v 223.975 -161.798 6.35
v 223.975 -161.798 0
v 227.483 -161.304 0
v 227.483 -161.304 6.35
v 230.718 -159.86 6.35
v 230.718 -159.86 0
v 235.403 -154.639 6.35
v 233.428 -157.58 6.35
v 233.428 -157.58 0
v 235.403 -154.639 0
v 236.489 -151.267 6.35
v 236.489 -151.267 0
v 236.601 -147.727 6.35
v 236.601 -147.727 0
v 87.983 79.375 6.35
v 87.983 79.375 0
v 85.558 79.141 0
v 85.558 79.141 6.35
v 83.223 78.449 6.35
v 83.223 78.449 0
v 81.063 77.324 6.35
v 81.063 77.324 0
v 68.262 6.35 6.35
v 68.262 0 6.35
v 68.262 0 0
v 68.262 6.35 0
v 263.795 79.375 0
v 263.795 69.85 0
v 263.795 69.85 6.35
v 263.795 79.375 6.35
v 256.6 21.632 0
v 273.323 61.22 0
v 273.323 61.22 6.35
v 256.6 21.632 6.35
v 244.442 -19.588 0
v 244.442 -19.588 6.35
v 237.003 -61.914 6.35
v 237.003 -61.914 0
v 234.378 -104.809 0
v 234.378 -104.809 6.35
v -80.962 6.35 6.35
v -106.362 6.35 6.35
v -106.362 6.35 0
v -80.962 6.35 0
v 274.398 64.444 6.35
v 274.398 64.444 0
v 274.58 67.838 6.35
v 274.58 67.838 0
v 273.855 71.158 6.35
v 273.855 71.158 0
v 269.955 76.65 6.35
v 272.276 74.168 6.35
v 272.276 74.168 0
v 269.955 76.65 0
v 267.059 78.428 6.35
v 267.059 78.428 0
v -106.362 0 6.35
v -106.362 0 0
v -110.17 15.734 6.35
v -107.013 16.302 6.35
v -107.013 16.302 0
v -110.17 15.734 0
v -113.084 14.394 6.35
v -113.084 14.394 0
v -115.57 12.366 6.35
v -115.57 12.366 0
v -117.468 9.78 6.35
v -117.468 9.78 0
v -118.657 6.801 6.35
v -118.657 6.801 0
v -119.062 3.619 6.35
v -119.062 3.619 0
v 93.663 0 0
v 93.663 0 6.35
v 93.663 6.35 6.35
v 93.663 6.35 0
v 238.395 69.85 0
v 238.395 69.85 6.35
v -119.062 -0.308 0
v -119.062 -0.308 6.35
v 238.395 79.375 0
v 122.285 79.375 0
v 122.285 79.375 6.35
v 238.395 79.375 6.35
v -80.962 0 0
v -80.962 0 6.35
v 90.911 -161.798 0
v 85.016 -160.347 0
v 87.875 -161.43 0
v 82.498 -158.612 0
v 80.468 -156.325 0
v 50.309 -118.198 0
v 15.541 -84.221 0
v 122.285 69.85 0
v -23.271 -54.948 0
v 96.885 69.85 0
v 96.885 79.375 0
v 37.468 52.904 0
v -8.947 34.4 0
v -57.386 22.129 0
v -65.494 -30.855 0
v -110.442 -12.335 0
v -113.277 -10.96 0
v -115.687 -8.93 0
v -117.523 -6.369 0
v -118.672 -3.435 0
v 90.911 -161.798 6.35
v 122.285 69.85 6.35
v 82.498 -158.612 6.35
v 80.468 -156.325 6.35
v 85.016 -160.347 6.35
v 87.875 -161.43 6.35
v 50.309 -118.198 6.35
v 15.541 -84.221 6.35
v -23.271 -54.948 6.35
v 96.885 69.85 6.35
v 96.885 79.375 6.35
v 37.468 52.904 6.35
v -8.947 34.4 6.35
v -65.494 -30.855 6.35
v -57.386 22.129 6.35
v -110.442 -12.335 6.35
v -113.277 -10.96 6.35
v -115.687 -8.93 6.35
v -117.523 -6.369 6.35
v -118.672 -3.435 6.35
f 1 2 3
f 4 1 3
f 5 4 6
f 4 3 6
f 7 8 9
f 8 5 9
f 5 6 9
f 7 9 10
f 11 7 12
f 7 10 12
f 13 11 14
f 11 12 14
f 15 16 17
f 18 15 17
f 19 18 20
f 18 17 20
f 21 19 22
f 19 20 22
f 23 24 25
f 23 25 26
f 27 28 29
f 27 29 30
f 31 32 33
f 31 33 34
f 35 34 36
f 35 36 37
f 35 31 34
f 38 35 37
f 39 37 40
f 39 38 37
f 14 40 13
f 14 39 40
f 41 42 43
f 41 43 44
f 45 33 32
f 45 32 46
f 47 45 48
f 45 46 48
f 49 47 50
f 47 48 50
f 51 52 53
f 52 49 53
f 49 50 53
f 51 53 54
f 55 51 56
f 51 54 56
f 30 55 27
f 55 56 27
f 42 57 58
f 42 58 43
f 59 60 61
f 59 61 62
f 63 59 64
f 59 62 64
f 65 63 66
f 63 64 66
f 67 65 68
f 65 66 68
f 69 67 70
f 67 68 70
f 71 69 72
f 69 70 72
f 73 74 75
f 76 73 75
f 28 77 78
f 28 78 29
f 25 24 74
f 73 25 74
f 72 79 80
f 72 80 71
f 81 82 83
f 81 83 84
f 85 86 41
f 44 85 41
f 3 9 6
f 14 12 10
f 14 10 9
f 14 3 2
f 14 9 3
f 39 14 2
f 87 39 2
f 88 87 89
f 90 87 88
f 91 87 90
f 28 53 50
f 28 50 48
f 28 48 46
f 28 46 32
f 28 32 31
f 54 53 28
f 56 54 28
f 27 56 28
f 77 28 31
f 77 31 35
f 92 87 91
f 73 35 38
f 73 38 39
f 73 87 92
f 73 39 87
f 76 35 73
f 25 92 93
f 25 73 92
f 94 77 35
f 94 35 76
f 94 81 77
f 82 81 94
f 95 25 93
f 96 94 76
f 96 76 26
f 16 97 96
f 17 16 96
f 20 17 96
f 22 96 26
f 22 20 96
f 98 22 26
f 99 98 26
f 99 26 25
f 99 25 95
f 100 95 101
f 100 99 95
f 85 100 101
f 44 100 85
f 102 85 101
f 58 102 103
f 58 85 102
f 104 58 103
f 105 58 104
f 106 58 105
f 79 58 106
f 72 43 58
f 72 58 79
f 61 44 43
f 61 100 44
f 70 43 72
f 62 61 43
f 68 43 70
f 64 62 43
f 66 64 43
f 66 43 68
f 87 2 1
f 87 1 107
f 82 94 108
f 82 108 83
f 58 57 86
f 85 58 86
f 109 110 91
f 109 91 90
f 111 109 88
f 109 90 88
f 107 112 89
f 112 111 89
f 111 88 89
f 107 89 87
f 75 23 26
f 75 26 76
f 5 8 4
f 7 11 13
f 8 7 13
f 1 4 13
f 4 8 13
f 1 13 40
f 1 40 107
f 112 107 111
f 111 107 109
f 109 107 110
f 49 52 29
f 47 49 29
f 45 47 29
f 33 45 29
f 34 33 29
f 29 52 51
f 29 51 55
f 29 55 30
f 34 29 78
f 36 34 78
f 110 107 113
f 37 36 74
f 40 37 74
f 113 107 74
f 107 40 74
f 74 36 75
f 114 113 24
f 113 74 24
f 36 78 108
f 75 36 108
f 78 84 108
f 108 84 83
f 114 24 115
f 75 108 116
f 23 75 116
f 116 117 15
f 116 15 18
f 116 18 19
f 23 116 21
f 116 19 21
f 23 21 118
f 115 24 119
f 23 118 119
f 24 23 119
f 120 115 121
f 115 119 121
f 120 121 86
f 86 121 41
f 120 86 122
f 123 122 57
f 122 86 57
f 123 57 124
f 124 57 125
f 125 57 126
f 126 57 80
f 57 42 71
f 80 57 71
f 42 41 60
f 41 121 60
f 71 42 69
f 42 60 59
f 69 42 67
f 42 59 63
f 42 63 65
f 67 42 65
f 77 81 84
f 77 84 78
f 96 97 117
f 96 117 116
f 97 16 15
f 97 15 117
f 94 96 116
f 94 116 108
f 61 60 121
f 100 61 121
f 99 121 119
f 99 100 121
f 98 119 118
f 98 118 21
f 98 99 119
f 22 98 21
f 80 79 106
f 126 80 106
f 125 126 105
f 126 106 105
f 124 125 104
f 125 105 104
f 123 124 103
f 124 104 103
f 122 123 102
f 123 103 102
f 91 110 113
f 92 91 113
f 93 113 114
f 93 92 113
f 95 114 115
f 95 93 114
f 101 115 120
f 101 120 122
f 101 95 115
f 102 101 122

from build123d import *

# Parameters (mm, degrees)
EXTRUDE1_DEPTH     = 6.35
CUT_EXTRUDE1_REACH = 327.914
SKETCH2_W          = 25.4
SKETCH2_H          = 6.35
FILLET1_R          = 12.7


with BuildPart() as part:
    # Sketch1 → Extrude1 (new body)
    with BuildSketch(Plane.XY):
        with BuildLine():
            Line((-119.0625, -9.525), (-119.0625, 15.875))
            ThreePointArc((-119.0625, 15.875), (-12.912203714, 33.137302813), (84.185416539, 79.375))
            Line((84.185416539, 79.375), (96.885416539, 79.375))
            Line((96.885416539, 79.375), (96.885416539, 69.85))
            Line((96.885416539, 69.85), (122.285416539, 69.85))
            Line((122.285416539, 69.85), (122.285416539, 79.375))
            Line((122.285416539, 79.375), (238.394583461, 79.375))
            Line((238.394583461, 79.375), (238.394583461, 69.85))
            Line((238.394583461, 69.85), (263.794583461, 69.85))
            Line((263.794583461, 69.85), (263.794583461, 79.375))
            Line((263.794583461, 79.375), (282.844583461, 79.375))
            ThreePointArc((282.844583461, 79.375), (240.685076339, -37.537420224), (238.394583461, -161.797999999))
            Line((238.394583461, -161.797999999), (84.185416539, -161.797999999))
            ThreePointArc((84.185416539, -161.797999999), (-4.377647242, -68.228339866), (-119.0625, -9.525))
        make_face()
    extrude(amount=EXTRUDE1_DEPTH)

    # Sketch2 → Cut-Extrude1 (cut, up to next)
    with BuildSketch(Plane.XY.offset(6.35), mode=Mode.PRIVATE) as cut_extrude1_sk1:
        with Locations((80.9625, 3.175)):
            Rectangle(SKETCH2_W, SKETCH2_H)
    cut_extrude1_tool1 = extrude(cut_extrude1_sk1.sketch, amount=-CUT_EXTRUDE1_REACH, mode=Mode.PRIVATE) & part.part
    # Sketch2 → Cut-Extrude1 (cut, up to next)
    with BuildSketch(Plane.XY.offset(6.35), mode=Mode.PRIVATE) as cut_extrude1_sk2:
        with Locations((-93.6625, 3.175)):
            Rectangle(SKETCH2_W, SKETCH2_H)
    cut_extrude1_tool2 = extrude(cut_extrude1_sk2.sketch, amount=-CUT_EXTRUDE1_REACH, mode=Mode.PRIVATE) & part.part
    add(cut_extrude1_tool1.solids().sort_by_distance((80.9625, 3.175, 6.35))[0], mode=Mode.SUBTRACT)
    add(cut_extrude1_tool2.solids().sort_by_distance((-93.6625, 3.175, 6.35))[0], mode=Mode.SUBTRACT)

    # Fillet1
    # the kernel refuses this fillet: 12.7 mm, written as the material it takes off along each edge
    with BuildSketch(Plane(origin=(-119.0625, -9.525, -23.042479417), x_dir=(0, 1, 0), z_dir=(0, 0, 1))) as fillet1_piece_1:
        with BuildLine():
            CenterArc((9.216991767, -12.7), FILLET1_R, 90, 71.264145378)
            Line((-2.810028359, -8.620687938), (-3.050568761, -8.539101697))
            ThreePointArc((-3.050568761, -8.539101697), (-1.620862846, -4.239985213), (-0.242413755, 0.075839116))
            Line((-0.242413755, 0.075839116), (0, 0.254))
            Line((0, 0.254), (9.216991767, 0.254))
            Line((9.216991767, 0.254), (9.216991767, 0))
        make_face()
    extrude(amount=52.434958835, mode=Mode.SUBTRACT)
    with BuildSketch(Plane(origin=(-119.0625, 15.875, -30.640711511), x_dir=(0, -1, 0), z_dir=(0, 0, 1))) as fillet1_piece_2:
        with BuildLine():
            CenterArc((12.256284605, 12.7), FILLET1_R, 182.936375733, 87.063624267)
            Line((-0.427040748, 12.049417188), (-0.680707255, 12.036405531))
            ThreePointArc((-0.680707255, 12.036405531), (-0.419694109, 6.017401636), (-0.253951201, -0.004978711))
            Line((-0.253951201, -0.004978711), (0, -0.254))
            Line((0, -0.254), (12.256284605, -0.254))
            Line((12.256284605, -0.254), (12.256284605, 0))
        make_face()
    extrude(amount=67.631423023, mode=Mode.SUBTRACT)
    with BuildSketch(Plane(origin=(84.185416539, 79.375, -9.493460645), x_dir=(-0.8358425258463126, -0.5489692814601342, 0), z_dir=(0, 0, 1))) as fillet1_piece_3:
        with BuildLine():
            CenterArc((3.797894625, 12.699847386), FILLET1_R, 236.703669928, 33.015441722)
            Line((-3.17401525, 2.084647308), (-3.313453447, 1.872343306))
            Line((-3.313453447, 1.872343306), (-0.139438197, -0.212304002))
            Line((-0.139438197, -0.212304002), (0.001245211, -0.253996948))
            ThreePointArc((0.001245211, -0.253996948), (1.867817029, -0.249421573), (3.734388846, -0.253996948))
            Line((3.734388846, -0.253996948), (3.735634057, 0))
        make_face()
    extrude(amount=25.33692129, mode=Mode.SUBTRACT)
    with BuildSketch(Plane(origin=(282.844583461, 79.375, -51.250606191), x_dir=(-0.4644541508381782, -0.8855971667576557, 0), z_dir=(0, 0, 1))) as fillet1_piece_4:
        with BuildLine():
            CenterArc((20.841913184, -12.695403149), FILLET1_R, 91.541626127, 107.65176457)
            Line((8.847851573, -16.870626027), (8.607970341, -16.954130484))
            ThreePointArc((8.607970341, -16.954130484), (4.198984106, -8.553284368), (-0.22494168, -0.117971354))
            Line((-0.22494168, -0.117971354), (0.006833414, 0.253908063))
            ThreePointArc((0.006833414, 0.253908063), (10.250121238, 0.116094484), (20.493409062, 0.253908063))
            Line((20.493409062, 0.253908063), (20.500242476, 0))
        make_face()
    extrude(amount=108.851212382, mode=Mode.SUBTRACT)
    with BuildSketch(Plane(origin=(238.394583461, -161.797999999, -36.048448379), x_dir=(-1, 0, 0), z_dir=(0, 0, 1))) as fillet1_piece_5:
        with BuildLine():
            CenterArc((14.419379352, -12.7), FILLET1_R, 90, 96.197539908)
            Line((1.793603229, -14.071049709), (1.541087707, -14.098470704))
            ThreePointArc((1.541087707, -14.098470704), (0.710330378, -7.0592939), (-0.251319787, -0.036801694))
            Line((-0.251319787, -0.036801694), (0, 0.254))
            Line((0, 0.254), (14.419379352, 0.254))
            Line((14.419379352, 0.254), (14.419379352, 0))
        make_face()
    extrude(amount=78.446896758, mode=Mode.SUBTRACT)
    with BuildSketch(Plane(origin=(84.185416539, -161.797999999, -16.813294938), x_dir=(-0.561921339312421, 0.827190672351505, 0), z_dir=(0, 0, 1))) as fillet1_piece_6:
        with BuildLine():
            CenterArc((6.726221855, -12.699521307), FILLET1_R, 90.497468654, 55.313755774)
            Line((-3.779099684, -5.563120298), (-3.989206115, -5.420392277))
            Line((-3.989206115, -5.420392277), (-0.210106431, 0.14272802))
            Line((-0.210106431, 0.14272802), (0.002205319, 0.253990426))
            ThreePointArc((0.002205319, 0.253990426), (3.307977961, 0.239639207), (6.613750604, 0.253990426))
            Line((6.613750604, 0.253990426), (6.615955923, 0))
        make_face()
    extrude(amount=39.976589876, mode=Mode.SUBTRACT)


solid = part.part
